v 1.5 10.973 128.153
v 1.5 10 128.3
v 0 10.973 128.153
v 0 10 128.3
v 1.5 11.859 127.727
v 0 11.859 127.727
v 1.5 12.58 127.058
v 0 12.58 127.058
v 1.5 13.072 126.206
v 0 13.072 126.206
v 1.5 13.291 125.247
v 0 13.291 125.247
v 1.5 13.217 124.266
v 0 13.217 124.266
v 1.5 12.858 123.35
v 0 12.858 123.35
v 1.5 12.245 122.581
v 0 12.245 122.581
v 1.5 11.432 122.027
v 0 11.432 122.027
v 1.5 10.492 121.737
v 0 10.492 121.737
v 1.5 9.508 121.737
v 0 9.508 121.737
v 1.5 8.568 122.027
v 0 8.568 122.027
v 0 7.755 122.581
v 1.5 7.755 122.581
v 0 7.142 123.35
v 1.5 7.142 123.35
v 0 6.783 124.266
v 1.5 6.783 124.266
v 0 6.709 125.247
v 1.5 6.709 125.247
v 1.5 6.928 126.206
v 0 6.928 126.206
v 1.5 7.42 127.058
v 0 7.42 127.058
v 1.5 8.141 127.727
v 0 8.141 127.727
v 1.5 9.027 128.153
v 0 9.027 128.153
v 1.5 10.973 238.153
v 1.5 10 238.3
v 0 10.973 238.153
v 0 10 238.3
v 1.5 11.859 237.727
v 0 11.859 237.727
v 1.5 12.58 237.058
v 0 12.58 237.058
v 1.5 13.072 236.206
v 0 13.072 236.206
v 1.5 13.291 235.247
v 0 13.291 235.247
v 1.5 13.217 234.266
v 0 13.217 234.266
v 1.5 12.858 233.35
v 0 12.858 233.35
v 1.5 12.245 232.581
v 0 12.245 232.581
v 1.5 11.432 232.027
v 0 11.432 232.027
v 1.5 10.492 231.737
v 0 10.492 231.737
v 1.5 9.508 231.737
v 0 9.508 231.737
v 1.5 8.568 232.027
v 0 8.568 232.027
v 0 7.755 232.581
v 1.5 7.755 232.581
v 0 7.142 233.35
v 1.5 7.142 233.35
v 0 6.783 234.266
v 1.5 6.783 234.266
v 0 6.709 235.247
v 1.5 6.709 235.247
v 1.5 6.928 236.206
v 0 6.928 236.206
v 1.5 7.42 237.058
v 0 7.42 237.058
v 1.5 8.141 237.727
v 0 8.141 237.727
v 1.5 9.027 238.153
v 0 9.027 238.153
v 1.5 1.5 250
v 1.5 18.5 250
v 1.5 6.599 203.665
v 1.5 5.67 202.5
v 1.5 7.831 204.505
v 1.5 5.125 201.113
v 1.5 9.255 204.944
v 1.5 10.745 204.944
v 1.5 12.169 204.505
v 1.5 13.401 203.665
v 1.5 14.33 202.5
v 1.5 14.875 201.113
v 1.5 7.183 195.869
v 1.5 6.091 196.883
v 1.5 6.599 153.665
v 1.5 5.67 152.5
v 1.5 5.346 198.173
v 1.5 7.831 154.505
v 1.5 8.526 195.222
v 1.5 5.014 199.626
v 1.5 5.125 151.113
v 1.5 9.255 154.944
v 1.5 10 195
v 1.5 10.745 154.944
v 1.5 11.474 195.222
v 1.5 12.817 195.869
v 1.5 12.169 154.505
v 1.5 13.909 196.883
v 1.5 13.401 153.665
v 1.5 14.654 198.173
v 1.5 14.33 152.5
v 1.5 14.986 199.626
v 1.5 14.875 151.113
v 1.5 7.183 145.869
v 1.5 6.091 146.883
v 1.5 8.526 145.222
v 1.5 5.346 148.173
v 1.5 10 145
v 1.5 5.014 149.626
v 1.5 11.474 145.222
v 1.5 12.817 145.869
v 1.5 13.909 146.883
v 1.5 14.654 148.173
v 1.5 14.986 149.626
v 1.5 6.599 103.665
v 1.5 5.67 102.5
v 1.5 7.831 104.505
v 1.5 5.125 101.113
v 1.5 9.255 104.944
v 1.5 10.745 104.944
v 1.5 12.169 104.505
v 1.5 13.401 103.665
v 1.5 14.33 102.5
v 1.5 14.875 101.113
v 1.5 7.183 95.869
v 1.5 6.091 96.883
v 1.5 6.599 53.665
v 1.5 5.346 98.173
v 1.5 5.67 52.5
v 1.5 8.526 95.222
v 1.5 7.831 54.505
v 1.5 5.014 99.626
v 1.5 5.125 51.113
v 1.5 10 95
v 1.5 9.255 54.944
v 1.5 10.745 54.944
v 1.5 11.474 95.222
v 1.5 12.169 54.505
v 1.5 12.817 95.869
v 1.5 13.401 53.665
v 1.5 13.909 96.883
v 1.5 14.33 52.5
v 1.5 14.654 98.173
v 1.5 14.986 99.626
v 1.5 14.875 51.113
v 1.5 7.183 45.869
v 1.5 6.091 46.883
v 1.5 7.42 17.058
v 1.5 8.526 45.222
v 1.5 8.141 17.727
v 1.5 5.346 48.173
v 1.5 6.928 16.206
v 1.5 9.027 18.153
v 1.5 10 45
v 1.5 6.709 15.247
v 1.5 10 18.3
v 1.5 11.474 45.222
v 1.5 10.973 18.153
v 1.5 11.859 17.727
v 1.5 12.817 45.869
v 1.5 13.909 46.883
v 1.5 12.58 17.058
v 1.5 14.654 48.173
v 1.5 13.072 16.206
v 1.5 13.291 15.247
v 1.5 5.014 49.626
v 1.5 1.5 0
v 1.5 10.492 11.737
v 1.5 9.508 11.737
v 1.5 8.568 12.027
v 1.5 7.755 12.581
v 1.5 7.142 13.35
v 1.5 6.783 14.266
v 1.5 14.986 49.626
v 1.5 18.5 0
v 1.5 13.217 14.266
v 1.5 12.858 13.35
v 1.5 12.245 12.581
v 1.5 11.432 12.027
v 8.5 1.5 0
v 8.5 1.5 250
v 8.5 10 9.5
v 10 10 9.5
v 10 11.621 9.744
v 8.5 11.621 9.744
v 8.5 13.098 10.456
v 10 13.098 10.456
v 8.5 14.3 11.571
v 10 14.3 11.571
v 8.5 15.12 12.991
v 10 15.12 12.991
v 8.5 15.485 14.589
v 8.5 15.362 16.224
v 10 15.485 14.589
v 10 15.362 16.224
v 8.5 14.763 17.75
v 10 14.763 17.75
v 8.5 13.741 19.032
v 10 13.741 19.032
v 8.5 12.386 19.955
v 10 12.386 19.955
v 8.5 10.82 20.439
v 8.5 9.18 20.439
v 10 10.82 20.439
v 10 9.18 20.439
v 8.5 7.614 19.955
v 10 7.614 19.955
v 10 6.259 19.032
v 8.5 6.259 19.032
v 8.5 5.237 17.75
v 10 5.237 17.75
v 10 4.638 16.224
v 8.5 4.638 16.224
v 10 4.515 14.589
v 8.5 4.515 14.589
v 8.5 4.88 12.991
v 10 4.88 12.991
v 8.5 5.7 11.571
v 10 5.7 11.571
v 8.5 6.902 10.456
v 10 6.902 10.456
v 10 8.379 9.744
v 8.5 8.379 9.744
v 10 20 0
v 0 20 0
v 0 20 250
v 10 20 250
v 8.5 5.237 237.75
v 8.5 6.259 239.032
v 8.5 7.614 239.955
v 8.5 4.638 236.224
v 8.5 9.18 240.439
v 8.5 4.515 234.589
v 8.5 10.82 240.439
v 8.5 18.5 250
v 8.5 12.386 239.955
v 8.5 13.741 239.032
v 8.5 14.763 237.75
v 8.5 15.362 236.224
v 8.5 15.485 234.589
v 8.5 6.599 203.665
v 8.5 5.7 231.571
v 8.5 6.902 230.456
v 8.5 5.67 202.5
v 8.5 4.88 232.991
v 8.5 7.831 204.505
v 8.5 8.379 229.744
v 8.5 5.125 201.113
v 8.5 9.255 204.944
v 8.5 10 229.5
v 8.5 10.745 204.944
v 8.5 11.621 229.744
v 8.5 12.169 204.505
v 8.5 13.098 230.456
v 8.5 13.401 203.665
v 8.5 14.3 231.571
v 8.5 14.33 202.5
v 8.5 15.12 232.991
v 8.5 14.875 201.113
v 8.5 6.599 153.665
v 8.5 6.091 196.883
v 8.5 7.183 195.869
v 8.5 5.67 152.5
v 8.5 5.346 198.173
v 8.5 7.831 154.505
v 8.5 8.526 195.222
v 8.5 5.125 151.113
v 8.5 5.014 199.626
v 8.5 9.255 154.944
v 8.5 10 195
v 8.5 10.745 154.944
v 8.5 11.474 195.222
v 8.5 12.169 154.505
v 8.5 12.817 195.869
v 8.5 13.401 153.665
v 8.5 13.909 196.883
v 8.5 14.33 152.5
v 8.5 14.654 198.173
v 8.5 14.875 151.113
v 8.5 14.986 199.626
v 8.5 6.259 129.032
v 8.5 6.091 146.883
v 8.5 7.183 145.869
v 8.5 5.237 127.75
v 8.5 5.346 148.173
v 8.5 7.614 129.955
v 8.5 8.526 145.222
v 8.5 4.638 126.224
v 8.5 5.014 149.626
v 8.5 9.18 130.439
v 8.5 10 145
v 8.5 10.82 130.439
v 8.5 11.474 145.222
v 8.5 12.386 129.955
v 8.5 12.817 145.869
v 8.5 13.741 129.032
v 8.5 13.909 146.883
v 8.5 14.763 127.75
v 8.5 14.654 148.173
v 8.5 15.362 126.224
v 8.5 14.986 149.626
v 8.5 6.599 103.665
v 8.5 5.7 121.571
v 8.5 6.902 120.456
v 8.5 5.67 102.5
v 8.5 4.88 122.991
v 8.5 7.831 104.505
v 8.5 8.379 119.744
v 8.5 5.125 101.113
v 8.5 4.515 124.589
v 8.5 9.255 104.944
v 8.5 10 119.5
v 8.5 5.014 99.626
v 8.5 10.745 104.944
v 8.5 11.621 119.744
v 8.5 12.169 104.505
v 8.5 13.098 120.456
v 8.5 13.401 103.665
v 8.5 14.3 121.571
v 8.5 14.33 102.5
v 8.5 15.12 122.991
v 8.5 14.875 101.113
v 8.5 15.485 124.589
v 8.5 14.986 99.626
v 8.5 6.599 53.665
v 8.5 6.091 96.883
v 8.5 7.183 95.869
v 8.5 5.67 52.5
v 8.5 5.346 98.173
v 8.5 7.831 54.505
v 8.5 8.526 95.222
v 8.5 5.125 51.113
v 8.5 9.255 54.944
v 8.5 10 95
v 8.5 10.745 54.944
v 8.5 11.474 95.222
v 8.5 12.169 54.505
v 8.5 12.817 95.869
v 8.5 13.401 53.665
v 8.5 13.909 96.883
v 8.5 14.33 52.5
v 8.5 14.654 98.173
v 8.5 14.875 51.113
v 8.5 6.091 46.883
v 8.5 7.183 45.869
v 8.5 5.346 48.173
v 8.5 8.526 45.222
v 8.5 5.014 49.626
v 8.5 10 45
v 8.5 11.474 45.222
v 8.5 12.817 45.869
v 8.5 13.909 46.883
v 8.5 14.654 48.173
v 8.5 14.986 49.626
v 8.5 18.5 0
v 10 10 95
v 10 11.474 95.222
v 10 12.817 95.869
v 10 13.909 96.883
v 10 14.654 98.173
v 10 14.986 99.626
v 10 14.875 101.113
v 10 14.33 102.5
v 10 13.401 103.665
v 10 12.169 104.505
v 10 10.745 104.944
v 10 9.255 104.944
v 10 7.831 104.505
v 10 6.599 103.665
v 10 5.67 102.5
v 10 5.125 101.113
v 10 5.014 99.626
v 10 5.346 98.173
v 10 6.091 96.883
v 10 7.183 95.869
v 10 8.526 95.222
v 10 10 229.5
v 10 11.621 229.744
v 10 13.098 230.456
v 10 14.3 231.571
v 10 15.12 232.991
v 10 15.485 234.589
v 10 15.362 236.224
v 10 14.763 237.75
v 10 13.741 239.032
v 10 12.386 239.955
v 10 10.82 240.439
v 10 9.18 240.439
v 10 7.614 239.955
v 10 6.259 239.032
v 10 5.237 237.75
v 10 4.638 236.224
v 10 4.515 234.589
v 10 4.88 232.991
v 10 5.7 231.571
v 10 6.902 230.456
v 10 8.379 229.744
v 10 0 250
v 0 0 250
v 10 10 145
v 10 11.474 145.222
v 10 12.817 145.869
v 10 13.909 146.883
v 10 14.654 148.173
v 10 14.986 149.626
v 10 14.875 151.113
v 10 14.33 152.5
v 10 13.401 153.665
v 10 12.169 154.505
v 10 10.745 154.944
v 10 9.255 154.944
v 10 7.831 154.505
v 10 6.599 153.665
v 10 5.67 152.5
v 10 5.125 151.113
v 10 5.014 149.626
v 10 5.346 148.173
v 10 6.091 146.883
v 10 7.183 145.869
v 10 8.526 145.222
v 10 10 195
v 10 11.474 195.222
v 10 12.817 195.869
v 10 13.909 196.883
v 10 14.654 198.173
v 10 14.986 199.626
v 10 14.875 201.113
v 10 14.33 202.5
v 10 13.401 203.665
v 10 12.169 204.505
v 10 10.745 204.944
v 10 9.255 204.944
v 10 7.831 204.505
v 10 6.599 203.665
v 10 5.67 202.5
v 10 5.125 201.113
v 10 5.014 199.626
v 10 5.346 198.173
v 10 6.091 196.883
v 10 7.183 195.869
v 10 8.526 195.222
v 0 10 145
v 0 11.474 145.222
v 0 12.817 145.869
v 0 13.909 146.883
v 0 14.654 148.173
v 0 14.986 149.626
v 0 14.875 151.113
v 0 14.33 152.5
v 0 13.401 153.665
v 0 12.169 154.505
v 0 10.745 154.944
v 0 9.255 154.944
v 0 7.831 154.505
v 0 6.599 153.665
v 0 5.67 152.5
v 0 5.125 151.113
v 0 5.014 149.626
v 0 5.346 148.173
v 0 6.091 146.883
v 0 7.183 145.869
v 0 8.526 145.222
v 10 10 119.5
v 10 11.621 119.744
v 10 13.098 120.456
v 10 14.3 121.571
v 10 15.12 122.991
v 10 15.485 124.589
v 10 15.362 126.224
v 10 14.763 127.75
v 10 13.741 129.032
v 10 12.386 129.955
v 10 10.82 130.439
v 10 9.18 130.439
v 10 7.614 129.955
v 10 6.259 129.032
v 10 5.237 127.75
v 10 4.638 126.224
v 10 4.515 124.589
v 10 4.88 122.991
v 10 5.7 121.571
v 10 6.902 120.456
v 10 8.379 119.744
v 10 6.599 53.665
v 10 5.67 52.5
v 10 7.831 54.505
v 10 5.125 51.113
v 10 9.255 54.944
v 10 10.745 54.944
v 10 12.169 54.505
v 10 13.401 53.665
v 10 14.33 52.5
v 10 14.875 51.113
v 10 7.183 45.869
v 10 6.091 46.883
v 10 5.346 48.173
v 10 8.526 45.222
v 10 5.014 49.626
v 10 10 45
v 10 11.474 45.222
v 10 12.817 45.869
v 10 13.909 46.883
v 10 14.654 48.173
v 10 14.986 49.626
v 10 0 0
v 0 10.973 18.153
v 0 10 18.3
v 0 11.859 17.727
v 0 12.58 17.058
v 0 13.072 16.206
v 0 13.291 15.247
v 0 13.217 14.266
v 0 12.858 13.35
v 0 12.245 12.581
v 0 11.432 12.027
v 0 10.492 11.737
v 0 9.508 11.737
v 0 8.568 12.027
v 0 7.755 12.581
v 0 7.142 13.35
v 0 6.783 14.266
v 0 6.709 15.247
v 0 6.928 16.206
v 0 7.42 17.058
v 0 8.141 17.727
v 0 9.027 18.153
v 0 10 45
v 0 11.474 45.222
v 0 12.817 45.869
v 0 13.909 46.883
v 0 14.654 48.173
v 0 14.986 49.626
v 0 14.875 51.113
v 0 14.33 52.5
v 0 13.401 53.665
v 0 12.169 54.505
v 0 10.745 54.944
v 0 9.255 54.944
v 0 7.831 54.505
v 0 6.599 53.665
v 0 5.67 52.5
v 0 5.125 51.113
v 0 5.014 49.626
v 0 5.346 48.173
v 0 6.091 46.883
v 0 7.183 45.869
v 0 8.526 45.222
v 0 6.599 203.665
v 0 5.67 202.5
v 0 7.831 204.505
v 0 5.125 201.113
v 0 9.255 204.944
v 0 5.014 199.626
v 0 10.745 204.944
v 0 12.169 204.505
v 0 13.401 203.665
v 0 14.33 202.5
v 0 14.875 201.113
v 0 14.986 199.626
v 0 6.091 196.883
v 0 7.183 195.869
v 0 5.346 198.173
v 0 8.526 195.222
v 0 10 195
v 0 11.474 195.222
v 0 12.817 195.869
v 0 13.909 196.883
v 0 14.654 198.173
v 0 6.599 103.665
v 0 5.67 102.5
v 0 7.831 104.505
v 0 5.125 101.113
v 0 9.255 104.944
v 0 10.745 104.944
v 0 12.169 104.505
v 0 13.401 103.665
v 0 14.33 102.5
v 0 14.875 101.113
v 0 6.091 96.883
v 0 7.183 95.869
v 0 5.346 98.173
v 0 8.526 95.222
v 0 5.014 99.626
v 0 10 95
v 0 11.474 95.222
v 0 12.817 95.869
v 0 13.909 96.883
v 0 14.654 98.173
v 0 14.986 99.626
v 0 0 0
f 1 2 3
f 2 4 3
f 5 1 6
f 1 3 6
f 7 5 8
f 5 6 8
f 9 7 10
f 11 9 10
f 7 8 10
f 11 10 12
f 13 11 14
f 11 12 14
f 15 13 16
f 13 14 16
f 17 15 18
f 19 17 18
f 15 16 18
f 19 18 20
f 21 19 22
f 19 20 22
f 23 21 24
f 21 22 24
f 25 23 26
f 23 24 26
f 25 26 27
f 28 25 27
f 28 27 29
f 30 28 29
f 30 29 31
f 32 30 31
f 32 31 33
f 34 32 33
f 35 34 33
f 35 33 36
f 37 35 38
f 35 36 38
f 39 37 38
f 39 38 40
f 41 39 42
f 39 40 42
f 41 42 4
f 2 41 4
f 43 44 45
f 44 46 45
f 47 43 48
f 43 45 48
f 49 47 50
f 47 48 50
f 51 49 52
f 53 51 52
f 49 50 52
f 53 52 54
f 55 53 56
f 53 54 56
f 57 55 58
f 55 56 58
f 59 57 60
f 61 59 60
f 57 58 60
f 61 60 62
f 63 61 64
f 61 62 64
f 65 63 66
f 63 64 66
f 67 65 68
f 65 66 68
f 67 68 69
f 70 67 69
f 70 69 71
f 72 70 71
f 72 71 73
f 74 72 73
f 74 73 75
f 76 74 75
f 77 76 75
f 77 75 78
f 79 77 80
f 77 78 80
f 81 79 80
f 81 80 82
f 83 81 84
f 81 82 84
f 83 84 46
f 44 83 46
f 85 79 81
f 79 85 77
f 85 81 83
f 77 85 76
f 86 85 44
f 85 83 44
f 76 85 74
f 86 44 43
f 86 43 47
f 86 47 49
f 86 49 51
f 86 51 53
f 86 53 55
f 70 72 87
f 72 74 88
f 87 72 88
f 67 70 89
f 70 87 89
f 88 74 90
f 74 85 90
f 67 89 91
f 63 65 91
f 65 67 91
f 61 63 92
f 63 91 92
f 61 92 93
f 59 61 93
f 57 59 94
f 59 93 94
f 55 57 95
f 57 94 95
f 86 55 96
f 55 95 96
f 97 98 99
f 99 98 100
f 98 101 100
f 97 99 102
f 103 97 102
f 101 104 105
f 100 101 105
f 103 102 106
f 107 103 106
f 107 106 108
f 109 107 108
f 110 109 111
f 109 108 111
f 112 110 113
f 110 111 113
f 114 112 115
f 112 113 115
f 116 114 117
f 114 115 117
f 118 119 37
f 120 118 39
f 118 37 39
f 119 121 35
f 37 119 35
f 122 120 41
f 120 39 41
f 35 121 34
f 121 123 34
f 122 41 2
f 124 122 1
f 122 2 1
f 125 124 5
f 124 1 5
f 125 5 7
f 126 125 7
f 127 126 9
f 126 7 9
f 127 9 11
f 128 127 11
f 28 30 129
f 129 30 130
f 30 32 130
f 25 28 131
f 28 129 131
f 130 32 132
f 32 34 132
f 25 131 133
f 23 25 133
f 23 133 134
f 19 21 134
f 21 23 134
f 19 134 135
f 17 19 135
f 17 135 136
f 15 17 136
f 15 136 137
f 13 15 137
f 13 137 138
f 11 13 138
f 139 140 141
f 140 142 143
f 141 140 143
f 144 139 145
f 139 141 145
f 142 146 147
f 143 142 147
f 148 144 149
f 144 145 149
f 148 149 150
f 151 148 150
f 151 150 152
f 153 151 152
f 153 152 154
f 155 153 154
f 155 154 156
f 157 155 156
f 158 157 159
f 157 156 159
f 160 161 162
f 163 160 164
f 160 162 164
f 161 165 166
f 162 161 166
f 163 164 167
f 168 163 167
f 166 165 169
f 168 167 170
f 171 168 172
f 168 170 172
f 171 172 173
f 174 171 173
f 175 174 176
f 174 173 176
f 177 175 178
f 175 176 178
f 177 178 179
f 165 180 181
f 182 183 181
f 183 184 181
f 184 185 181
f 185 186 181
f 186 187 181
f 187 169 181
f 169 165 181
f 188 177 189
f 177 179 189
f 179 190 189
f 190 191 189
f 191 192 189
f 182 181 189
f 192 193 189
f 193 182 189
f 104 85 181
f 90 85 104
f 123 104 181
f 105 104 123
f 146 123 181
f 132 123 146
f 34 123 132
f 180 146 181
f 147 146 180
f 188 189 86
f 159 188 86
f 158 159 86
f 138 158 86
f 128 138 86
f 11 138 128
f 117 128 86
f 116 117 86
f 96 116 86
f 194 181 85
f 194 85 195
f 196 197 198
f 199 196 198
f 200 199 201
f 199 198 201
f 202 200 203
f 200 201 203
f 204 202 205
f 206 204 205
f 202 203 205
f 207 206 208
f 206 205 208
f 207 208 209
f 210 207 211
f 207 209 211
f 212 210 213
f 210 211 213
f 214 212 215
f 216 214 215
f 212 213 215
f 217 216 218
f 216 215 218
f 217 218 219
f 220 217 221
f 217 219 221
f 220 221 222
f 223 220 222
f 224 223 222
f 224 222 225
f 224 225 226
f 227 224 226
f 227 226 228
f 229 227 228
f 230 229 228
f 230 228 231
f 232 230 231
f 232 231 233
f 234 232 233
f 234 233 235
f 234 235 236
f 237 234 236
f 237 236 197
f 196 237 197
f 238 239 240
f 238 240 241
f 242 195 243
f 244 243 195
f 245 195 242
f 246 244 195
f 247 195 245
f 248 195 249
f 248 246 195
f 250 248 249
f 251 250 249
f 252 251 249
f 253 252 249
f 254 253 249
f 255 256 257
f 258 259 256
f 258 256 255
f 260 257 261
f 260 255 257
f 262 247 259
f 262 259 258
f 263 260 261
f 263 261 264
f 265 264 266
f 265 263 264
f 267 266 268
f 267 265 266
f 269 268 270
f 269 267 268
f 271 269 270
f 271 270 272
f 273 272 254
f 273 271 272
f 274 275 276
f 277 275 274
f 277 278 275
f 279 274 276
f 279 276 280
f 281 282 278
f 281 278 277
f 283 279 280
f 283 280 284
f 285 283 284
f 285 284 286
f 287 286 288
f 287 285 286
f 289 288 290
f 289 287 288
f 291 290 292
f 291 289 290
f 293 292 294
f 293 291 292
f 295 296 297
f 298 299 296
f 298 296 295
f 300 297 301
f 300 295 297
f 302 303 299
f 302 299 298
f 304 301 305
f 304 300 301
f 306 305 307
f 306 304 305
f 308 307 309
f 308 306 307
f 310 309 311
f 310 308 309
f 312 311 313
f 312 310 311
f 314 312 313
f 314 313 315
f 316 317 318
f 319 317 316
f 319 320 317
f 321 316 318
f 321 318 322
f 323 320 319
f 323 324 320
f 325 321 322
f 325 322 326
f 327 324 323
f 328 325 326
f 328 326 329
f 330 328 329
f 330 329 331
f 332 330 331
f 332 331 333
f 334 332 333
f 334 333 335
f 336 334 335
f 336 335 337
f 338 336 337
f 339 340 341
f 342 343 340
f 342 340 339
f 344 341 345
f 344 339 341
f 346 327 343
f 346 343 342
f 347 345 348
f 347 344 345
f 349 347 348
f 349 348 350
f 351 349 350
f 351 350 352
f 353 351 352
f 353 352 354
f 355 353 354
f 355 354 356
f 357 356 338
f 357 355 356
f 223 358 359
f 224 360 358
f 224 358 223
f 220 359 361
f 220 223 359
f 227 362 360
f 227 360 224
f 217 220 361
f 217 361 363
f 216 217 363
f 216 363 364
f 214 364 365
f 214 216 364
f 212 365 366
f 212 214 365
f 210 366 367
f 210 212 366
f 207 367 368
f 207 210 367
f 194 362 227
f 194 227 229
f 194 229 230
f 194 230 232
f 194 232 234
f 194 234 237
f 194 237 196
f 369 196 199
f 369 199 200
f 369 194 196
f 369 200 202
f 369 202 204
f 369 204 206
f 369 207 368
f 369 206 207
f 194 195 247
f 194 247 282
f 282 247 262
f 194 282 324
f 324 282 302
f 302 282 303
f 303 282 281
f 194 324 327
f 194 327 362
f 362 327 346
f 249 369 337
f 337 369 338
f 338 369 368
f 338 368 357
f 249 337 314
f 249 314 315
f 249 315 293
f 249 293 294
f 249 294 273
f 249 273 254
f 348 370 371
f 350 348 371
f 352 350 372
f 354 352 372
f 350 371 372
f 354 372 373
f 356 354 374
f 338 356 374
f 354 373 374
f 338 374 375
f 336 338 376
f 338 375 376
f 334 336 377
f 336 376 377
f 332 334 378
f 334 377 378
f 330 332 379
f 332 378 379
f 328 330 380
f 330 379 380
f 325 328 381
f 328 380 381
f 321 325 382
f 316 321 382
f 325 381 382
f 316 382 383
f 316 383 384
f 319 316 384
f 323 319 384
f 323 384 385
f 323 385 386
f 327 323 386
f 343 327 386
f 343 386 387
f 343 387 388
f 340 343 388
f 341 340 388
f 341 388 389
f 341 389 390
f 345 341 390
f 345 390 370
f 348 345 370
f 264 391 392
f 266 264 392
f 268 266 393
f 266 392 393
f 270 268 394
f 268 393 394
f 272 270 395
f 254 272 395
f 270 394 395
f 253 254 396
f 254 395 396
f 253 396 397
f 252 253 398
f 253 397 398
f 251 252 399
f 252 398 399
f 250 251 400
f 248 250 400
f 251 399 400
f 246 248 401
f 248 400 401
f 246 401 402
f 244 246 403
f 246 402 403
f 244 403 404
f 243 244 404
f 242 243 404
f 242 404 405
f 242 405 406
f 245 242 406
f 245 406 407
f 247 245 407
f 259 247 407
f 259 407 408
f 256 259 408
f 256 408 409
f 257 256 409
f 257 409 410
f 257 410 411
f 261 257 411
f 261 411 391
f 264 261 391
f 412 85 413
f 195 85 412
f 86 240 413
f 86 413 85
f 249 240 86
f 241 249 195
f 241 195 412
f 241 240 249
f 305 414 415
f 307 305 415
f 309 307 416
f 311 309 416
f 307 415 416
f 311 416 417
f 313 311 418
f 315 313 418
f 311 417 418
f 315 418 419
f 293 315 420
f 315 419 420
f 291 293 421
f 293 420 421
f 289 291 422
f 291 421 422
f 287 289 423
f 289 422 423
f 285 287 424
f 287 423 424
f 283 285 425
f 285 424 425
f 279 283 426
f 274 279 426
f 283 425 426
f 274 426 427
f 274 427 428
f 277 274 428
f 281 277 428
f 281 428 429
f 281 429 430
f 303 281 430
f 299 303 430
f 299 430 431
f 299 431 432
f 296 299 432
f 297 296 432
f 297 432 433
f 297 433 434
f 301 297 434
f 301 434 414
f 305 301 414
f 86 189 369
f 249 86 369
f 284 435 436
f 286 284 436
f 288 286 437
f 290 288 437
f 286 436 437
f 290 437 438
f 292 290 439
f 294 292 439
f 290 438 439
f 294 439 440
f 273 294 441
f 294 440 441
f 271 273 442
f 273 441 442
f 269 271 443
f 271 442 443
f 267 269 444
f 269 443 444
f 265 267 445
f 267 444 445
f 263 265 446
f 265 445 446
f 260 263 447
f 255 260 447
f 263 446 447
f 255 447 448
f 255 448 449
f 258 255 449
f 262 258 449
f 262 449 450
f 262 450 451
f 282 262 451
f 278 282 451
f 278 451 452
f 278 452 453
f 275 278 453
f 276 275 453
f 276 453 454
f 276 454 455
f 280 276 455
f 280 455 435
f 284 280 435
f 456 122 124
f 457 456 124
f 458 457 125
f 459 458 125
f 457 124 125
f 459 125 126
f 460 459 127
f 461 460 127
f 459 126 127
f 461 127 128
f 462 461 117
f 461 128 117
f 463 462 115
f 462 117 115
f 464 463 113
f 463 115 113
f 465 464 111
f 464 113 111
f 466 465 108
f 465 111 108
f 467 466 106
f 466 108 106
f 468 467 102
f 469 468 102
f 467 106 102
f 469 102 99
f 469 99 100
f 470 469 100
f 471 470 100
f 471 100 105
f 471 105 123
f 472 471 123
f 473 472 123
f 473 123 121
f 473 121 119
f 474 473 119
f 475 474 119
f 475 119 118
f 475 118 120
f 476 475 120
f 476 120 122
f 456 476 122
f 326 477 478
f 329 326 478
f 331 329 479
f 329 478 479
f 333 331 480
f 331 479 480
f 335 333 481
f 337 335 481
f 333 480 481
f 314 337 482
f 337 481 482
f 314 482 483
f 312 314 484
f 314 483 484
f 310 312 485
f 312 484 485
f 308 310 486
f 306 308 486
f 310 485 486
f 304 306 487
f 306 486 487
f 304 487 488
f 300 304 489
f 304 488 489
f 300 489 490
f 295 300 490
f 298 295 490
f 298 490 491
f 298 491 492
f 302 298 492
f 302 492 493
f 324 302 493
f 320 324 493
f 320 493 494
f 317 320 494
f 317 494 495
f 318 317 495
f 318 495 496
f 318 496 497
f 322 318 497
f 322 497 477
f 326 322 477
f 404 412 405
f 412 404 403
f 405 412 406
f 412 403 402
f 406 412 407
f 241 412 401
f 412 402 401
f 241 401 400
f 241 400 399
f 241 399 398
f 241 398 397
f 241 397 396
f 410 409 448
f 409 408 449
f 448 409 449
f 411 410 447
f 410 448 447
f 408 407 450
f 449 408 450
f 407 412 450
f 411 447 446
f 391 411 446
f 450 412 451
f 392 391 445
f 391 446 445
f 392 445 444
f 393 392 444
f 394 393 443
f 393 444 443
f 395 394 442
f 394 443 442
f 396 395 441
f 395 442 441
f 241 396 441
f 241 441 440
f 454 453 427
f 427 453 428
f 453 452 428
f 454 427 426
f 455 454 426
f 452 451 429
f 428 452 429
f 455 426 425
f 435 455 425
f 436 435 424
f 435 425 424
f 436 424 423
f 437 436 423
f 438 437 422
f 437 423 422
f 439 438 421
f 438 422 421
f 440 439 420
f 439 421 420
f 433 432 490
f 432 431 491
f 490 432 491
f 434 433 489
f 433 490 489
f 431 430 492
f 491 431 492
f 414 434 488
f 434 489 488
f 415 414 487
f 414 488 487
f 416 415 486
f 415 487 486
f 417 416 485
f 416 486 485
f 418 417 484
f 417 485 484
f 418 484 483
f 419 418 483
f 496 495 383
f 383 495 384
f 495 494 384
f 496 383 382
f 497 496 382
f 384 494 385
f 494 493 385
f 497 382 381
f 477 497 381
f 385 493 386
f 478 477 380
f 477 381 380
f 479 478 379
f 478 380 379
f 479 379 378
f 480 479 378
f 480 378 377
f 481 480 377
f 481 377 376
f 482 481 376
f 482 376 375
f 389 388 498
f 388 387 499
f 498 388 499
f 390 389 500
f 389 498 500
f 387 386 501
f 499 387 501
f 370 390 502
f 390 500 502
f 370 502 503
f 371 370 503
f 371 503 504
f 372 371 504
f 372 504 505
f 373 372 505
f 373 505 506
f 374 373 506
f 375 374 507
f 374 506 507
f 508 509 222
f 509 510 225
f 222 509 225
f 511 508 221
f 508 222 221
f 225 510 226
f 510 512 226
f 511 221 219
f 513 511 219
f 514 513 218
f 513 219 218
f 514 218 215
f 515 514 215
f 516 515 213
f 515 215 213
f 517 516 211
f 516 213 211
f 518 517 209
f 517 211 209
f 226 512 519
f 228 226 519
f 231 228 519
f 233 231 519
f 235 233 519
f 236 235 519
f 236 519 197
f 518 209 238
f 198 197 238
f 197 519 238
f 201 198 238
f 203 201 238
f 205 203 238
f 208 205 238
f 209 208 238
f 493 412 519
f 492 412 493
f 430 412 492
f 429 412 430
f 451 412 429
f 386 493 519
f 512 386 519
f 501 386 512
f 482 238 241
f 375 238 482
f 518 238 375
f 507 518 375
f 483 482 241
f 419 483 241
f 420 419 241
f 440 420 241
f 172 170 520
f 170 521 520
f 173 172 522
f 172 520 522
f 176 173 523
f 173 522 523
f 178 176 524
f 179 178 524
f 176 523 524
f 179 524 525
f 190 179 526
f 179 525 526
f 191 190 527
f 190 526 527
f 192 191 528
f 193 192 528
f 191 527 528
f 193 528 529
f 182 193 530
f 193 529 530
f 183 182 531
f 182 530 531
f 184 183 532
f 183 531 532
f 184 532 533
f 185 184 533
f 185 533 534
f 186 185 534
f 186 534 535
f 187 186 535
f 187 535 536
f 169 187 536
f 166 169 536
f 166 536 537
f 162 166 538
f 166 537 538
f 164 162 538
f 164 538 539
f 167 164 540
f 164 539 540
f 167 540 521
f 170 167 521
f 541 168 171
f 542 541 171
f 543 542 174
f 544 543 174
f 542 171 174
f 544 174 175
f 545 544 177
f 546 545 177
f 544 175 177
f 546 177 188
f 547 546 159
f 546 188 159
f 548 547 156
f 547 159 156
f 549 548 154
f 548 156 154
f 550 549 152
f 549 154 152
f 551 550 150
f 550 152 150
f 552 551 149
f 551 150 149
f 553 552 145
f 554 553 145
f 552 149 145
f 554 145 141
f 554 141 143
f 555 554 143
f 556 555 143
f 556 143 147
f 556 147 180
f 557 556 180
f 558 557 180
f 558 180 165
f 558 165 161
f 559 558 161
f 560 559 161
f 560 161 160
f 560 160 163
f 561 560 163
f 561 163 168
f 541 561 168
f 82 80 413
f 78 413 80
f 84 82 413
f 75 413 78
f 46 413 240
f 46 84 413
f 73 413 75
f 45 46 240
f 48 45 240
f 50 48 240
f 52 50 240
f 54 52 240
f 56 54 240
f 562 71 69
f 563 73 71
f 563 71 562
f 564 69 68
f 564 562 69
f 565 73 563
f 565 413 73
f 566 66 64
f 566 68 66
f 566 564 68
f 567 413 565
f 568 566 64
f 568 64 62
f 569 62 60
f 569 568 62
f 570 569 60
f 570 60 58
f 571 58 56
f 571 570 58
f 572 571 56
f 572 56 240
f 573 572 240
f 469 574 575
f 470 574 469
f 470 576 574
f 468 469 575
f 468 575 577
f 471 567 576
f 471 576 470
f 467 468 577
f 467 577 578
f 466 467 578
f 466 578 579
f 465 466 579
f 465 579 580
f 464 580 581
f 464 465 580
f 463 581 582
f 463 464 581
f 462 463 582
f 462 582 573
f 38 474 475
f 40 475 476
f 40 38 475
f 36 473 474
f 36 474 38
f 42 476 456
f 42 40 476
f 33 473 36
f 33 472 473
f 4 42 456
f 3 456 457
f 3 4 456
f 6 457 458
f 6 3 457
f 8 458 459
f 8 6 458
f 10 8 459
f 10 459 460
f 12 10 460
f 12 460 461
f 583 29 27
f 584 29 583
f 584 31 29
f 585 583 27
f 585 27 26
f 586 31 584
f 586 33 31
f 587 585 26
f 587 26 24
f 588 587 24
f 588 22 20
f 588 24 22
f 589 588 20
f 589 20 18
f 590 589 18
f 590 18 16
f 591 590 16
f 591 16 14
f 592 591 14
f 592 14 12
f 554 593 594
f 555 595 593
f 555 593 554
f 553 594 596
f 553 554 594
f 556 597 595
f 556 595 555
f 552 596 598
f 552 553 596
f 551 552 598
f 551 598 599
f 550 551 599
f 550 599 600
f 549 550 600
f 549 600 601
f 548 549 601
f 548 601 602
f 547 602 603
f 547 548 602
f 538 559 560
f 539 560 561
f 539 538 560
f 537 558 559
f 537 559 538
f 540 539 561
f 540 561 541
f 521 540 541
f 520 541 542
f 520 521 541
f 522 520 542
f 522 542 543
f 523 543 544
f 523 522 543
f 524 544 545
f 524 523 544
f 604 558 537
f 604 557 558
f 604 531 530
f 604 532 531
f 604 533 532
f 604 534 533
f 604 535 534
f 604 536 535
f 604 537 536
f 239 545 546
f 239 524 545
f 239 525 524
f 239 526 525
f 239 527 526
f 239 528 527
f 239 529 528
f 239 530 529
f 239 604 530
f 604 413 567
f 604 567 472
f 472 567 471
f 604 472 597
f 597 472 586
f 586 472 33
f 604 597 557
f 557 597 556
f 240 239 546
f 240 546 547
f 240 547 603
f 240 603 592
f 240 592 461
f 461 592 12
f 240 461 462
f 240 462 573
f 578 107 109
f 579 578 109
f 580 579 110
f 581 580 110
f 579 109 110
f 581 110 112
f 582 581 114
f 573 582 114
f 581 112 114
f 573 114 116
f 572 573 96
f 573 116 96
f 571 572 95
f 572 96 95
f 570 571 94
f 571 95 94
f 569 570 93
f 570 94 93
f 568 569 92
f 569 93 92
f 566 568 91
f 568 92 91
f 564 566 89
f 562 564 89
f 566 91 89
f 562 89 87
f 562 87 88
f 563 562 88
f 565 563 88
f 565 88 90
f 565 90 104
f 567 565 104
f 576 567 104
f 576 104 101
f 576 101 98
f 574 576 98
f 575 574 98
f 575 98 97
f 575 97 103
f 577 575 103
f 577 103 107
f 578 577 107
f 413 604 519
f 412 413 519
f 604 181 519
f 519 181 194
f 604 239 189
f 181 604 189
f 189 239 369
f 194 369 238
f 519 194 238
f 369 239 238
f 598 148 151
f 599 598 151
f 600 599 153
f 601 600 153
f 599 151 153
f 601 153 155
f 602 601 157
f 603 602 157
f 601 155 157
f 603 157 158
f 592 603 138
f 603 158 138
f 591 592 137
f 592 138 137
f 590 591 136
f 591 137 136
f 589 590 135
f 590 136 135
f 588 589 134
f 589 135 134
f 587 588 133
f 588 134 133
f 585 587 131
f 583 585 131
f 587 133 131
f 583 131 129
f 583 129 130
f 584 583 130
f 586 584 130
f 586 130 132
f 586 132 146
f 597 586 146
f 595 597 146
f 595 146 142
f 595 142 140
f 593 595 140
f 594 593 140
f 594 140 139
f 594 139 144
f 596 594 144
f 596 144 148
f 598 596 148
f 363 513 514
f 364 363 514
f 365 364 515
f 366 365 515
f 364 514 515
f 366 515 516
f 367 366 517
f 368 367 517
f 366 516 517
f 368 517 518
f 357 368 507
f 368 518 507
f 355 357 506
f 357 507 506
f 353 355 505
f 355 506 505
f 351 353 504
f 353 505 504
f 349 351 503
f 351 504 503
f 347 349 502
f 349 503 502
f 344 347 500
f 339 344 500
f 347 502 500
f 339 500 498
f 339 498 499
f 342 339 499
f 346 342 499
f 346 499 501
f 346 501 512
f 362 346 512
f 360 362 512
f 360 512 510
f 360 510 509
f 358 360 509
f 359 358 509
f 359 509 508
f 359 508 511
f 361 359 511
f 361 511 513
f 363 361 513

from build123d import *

# Parameters (mm, degrees)
SKETCH_1_W                  = 10
SKETCH_1_H                  = 20
SKETCH_1_W_2                = 7
SKETCH_1_H_2                = 17
EXTRUDE_1_DEPTH             = 250
HOLE_WIZARD_M61_D           = 6.6
HOLE_WIZARD_M61_CBORE_D     = 11
HOLE_WIZARD_M61_CBORE_DEPTH = 6.4
HOLE_WIZARD_1_D             = 10
HOLE_WIZARD_1_DEPTH         = 100


with BuildPart() as part:
    # Эскиз1 → Вытянуть-Тонкостенный1 (new body)
    with BuildSketch(Plane.XY):
        with Locations((5, 10)):
            Rectangle(SKETCH_1_W, SKETCH_1_H)
        with Locations((5, 10)):
            Rectangle(SKETCH_1_W_2, SKETCH_1_H_2, mode=Mode.SUBTRACT)
    extrude(amount=EXTRUDE_1_DEPTH)

    # Цековка для  винта с внутренним шестигранником M61 (through all)
    with Locations(Plane(origin=(10, 0, 0), x_dir=(0, 0, -1), z_dir=(1, 0, 0))):
        with Locations((-235, 10), (-125, 10), (-15, 10)):
            CounterBoreHole(HOLE_WIZARD_M61_D / 2, HOLE_WIZARD_M61_CBORE_D / 2, HOLE_WIZARD_M61_CBORE_DEPTH)

    # Отверстие1
    with Locations(Plane.ZY):
        with Locations((50, 10), (100, 10), (150, 10), (200, 10)):
            Hole(HOLE_WIZARD_1_D / 2, depth=HOLE_WIZARD_1_DEPTH)


solid = part.part
